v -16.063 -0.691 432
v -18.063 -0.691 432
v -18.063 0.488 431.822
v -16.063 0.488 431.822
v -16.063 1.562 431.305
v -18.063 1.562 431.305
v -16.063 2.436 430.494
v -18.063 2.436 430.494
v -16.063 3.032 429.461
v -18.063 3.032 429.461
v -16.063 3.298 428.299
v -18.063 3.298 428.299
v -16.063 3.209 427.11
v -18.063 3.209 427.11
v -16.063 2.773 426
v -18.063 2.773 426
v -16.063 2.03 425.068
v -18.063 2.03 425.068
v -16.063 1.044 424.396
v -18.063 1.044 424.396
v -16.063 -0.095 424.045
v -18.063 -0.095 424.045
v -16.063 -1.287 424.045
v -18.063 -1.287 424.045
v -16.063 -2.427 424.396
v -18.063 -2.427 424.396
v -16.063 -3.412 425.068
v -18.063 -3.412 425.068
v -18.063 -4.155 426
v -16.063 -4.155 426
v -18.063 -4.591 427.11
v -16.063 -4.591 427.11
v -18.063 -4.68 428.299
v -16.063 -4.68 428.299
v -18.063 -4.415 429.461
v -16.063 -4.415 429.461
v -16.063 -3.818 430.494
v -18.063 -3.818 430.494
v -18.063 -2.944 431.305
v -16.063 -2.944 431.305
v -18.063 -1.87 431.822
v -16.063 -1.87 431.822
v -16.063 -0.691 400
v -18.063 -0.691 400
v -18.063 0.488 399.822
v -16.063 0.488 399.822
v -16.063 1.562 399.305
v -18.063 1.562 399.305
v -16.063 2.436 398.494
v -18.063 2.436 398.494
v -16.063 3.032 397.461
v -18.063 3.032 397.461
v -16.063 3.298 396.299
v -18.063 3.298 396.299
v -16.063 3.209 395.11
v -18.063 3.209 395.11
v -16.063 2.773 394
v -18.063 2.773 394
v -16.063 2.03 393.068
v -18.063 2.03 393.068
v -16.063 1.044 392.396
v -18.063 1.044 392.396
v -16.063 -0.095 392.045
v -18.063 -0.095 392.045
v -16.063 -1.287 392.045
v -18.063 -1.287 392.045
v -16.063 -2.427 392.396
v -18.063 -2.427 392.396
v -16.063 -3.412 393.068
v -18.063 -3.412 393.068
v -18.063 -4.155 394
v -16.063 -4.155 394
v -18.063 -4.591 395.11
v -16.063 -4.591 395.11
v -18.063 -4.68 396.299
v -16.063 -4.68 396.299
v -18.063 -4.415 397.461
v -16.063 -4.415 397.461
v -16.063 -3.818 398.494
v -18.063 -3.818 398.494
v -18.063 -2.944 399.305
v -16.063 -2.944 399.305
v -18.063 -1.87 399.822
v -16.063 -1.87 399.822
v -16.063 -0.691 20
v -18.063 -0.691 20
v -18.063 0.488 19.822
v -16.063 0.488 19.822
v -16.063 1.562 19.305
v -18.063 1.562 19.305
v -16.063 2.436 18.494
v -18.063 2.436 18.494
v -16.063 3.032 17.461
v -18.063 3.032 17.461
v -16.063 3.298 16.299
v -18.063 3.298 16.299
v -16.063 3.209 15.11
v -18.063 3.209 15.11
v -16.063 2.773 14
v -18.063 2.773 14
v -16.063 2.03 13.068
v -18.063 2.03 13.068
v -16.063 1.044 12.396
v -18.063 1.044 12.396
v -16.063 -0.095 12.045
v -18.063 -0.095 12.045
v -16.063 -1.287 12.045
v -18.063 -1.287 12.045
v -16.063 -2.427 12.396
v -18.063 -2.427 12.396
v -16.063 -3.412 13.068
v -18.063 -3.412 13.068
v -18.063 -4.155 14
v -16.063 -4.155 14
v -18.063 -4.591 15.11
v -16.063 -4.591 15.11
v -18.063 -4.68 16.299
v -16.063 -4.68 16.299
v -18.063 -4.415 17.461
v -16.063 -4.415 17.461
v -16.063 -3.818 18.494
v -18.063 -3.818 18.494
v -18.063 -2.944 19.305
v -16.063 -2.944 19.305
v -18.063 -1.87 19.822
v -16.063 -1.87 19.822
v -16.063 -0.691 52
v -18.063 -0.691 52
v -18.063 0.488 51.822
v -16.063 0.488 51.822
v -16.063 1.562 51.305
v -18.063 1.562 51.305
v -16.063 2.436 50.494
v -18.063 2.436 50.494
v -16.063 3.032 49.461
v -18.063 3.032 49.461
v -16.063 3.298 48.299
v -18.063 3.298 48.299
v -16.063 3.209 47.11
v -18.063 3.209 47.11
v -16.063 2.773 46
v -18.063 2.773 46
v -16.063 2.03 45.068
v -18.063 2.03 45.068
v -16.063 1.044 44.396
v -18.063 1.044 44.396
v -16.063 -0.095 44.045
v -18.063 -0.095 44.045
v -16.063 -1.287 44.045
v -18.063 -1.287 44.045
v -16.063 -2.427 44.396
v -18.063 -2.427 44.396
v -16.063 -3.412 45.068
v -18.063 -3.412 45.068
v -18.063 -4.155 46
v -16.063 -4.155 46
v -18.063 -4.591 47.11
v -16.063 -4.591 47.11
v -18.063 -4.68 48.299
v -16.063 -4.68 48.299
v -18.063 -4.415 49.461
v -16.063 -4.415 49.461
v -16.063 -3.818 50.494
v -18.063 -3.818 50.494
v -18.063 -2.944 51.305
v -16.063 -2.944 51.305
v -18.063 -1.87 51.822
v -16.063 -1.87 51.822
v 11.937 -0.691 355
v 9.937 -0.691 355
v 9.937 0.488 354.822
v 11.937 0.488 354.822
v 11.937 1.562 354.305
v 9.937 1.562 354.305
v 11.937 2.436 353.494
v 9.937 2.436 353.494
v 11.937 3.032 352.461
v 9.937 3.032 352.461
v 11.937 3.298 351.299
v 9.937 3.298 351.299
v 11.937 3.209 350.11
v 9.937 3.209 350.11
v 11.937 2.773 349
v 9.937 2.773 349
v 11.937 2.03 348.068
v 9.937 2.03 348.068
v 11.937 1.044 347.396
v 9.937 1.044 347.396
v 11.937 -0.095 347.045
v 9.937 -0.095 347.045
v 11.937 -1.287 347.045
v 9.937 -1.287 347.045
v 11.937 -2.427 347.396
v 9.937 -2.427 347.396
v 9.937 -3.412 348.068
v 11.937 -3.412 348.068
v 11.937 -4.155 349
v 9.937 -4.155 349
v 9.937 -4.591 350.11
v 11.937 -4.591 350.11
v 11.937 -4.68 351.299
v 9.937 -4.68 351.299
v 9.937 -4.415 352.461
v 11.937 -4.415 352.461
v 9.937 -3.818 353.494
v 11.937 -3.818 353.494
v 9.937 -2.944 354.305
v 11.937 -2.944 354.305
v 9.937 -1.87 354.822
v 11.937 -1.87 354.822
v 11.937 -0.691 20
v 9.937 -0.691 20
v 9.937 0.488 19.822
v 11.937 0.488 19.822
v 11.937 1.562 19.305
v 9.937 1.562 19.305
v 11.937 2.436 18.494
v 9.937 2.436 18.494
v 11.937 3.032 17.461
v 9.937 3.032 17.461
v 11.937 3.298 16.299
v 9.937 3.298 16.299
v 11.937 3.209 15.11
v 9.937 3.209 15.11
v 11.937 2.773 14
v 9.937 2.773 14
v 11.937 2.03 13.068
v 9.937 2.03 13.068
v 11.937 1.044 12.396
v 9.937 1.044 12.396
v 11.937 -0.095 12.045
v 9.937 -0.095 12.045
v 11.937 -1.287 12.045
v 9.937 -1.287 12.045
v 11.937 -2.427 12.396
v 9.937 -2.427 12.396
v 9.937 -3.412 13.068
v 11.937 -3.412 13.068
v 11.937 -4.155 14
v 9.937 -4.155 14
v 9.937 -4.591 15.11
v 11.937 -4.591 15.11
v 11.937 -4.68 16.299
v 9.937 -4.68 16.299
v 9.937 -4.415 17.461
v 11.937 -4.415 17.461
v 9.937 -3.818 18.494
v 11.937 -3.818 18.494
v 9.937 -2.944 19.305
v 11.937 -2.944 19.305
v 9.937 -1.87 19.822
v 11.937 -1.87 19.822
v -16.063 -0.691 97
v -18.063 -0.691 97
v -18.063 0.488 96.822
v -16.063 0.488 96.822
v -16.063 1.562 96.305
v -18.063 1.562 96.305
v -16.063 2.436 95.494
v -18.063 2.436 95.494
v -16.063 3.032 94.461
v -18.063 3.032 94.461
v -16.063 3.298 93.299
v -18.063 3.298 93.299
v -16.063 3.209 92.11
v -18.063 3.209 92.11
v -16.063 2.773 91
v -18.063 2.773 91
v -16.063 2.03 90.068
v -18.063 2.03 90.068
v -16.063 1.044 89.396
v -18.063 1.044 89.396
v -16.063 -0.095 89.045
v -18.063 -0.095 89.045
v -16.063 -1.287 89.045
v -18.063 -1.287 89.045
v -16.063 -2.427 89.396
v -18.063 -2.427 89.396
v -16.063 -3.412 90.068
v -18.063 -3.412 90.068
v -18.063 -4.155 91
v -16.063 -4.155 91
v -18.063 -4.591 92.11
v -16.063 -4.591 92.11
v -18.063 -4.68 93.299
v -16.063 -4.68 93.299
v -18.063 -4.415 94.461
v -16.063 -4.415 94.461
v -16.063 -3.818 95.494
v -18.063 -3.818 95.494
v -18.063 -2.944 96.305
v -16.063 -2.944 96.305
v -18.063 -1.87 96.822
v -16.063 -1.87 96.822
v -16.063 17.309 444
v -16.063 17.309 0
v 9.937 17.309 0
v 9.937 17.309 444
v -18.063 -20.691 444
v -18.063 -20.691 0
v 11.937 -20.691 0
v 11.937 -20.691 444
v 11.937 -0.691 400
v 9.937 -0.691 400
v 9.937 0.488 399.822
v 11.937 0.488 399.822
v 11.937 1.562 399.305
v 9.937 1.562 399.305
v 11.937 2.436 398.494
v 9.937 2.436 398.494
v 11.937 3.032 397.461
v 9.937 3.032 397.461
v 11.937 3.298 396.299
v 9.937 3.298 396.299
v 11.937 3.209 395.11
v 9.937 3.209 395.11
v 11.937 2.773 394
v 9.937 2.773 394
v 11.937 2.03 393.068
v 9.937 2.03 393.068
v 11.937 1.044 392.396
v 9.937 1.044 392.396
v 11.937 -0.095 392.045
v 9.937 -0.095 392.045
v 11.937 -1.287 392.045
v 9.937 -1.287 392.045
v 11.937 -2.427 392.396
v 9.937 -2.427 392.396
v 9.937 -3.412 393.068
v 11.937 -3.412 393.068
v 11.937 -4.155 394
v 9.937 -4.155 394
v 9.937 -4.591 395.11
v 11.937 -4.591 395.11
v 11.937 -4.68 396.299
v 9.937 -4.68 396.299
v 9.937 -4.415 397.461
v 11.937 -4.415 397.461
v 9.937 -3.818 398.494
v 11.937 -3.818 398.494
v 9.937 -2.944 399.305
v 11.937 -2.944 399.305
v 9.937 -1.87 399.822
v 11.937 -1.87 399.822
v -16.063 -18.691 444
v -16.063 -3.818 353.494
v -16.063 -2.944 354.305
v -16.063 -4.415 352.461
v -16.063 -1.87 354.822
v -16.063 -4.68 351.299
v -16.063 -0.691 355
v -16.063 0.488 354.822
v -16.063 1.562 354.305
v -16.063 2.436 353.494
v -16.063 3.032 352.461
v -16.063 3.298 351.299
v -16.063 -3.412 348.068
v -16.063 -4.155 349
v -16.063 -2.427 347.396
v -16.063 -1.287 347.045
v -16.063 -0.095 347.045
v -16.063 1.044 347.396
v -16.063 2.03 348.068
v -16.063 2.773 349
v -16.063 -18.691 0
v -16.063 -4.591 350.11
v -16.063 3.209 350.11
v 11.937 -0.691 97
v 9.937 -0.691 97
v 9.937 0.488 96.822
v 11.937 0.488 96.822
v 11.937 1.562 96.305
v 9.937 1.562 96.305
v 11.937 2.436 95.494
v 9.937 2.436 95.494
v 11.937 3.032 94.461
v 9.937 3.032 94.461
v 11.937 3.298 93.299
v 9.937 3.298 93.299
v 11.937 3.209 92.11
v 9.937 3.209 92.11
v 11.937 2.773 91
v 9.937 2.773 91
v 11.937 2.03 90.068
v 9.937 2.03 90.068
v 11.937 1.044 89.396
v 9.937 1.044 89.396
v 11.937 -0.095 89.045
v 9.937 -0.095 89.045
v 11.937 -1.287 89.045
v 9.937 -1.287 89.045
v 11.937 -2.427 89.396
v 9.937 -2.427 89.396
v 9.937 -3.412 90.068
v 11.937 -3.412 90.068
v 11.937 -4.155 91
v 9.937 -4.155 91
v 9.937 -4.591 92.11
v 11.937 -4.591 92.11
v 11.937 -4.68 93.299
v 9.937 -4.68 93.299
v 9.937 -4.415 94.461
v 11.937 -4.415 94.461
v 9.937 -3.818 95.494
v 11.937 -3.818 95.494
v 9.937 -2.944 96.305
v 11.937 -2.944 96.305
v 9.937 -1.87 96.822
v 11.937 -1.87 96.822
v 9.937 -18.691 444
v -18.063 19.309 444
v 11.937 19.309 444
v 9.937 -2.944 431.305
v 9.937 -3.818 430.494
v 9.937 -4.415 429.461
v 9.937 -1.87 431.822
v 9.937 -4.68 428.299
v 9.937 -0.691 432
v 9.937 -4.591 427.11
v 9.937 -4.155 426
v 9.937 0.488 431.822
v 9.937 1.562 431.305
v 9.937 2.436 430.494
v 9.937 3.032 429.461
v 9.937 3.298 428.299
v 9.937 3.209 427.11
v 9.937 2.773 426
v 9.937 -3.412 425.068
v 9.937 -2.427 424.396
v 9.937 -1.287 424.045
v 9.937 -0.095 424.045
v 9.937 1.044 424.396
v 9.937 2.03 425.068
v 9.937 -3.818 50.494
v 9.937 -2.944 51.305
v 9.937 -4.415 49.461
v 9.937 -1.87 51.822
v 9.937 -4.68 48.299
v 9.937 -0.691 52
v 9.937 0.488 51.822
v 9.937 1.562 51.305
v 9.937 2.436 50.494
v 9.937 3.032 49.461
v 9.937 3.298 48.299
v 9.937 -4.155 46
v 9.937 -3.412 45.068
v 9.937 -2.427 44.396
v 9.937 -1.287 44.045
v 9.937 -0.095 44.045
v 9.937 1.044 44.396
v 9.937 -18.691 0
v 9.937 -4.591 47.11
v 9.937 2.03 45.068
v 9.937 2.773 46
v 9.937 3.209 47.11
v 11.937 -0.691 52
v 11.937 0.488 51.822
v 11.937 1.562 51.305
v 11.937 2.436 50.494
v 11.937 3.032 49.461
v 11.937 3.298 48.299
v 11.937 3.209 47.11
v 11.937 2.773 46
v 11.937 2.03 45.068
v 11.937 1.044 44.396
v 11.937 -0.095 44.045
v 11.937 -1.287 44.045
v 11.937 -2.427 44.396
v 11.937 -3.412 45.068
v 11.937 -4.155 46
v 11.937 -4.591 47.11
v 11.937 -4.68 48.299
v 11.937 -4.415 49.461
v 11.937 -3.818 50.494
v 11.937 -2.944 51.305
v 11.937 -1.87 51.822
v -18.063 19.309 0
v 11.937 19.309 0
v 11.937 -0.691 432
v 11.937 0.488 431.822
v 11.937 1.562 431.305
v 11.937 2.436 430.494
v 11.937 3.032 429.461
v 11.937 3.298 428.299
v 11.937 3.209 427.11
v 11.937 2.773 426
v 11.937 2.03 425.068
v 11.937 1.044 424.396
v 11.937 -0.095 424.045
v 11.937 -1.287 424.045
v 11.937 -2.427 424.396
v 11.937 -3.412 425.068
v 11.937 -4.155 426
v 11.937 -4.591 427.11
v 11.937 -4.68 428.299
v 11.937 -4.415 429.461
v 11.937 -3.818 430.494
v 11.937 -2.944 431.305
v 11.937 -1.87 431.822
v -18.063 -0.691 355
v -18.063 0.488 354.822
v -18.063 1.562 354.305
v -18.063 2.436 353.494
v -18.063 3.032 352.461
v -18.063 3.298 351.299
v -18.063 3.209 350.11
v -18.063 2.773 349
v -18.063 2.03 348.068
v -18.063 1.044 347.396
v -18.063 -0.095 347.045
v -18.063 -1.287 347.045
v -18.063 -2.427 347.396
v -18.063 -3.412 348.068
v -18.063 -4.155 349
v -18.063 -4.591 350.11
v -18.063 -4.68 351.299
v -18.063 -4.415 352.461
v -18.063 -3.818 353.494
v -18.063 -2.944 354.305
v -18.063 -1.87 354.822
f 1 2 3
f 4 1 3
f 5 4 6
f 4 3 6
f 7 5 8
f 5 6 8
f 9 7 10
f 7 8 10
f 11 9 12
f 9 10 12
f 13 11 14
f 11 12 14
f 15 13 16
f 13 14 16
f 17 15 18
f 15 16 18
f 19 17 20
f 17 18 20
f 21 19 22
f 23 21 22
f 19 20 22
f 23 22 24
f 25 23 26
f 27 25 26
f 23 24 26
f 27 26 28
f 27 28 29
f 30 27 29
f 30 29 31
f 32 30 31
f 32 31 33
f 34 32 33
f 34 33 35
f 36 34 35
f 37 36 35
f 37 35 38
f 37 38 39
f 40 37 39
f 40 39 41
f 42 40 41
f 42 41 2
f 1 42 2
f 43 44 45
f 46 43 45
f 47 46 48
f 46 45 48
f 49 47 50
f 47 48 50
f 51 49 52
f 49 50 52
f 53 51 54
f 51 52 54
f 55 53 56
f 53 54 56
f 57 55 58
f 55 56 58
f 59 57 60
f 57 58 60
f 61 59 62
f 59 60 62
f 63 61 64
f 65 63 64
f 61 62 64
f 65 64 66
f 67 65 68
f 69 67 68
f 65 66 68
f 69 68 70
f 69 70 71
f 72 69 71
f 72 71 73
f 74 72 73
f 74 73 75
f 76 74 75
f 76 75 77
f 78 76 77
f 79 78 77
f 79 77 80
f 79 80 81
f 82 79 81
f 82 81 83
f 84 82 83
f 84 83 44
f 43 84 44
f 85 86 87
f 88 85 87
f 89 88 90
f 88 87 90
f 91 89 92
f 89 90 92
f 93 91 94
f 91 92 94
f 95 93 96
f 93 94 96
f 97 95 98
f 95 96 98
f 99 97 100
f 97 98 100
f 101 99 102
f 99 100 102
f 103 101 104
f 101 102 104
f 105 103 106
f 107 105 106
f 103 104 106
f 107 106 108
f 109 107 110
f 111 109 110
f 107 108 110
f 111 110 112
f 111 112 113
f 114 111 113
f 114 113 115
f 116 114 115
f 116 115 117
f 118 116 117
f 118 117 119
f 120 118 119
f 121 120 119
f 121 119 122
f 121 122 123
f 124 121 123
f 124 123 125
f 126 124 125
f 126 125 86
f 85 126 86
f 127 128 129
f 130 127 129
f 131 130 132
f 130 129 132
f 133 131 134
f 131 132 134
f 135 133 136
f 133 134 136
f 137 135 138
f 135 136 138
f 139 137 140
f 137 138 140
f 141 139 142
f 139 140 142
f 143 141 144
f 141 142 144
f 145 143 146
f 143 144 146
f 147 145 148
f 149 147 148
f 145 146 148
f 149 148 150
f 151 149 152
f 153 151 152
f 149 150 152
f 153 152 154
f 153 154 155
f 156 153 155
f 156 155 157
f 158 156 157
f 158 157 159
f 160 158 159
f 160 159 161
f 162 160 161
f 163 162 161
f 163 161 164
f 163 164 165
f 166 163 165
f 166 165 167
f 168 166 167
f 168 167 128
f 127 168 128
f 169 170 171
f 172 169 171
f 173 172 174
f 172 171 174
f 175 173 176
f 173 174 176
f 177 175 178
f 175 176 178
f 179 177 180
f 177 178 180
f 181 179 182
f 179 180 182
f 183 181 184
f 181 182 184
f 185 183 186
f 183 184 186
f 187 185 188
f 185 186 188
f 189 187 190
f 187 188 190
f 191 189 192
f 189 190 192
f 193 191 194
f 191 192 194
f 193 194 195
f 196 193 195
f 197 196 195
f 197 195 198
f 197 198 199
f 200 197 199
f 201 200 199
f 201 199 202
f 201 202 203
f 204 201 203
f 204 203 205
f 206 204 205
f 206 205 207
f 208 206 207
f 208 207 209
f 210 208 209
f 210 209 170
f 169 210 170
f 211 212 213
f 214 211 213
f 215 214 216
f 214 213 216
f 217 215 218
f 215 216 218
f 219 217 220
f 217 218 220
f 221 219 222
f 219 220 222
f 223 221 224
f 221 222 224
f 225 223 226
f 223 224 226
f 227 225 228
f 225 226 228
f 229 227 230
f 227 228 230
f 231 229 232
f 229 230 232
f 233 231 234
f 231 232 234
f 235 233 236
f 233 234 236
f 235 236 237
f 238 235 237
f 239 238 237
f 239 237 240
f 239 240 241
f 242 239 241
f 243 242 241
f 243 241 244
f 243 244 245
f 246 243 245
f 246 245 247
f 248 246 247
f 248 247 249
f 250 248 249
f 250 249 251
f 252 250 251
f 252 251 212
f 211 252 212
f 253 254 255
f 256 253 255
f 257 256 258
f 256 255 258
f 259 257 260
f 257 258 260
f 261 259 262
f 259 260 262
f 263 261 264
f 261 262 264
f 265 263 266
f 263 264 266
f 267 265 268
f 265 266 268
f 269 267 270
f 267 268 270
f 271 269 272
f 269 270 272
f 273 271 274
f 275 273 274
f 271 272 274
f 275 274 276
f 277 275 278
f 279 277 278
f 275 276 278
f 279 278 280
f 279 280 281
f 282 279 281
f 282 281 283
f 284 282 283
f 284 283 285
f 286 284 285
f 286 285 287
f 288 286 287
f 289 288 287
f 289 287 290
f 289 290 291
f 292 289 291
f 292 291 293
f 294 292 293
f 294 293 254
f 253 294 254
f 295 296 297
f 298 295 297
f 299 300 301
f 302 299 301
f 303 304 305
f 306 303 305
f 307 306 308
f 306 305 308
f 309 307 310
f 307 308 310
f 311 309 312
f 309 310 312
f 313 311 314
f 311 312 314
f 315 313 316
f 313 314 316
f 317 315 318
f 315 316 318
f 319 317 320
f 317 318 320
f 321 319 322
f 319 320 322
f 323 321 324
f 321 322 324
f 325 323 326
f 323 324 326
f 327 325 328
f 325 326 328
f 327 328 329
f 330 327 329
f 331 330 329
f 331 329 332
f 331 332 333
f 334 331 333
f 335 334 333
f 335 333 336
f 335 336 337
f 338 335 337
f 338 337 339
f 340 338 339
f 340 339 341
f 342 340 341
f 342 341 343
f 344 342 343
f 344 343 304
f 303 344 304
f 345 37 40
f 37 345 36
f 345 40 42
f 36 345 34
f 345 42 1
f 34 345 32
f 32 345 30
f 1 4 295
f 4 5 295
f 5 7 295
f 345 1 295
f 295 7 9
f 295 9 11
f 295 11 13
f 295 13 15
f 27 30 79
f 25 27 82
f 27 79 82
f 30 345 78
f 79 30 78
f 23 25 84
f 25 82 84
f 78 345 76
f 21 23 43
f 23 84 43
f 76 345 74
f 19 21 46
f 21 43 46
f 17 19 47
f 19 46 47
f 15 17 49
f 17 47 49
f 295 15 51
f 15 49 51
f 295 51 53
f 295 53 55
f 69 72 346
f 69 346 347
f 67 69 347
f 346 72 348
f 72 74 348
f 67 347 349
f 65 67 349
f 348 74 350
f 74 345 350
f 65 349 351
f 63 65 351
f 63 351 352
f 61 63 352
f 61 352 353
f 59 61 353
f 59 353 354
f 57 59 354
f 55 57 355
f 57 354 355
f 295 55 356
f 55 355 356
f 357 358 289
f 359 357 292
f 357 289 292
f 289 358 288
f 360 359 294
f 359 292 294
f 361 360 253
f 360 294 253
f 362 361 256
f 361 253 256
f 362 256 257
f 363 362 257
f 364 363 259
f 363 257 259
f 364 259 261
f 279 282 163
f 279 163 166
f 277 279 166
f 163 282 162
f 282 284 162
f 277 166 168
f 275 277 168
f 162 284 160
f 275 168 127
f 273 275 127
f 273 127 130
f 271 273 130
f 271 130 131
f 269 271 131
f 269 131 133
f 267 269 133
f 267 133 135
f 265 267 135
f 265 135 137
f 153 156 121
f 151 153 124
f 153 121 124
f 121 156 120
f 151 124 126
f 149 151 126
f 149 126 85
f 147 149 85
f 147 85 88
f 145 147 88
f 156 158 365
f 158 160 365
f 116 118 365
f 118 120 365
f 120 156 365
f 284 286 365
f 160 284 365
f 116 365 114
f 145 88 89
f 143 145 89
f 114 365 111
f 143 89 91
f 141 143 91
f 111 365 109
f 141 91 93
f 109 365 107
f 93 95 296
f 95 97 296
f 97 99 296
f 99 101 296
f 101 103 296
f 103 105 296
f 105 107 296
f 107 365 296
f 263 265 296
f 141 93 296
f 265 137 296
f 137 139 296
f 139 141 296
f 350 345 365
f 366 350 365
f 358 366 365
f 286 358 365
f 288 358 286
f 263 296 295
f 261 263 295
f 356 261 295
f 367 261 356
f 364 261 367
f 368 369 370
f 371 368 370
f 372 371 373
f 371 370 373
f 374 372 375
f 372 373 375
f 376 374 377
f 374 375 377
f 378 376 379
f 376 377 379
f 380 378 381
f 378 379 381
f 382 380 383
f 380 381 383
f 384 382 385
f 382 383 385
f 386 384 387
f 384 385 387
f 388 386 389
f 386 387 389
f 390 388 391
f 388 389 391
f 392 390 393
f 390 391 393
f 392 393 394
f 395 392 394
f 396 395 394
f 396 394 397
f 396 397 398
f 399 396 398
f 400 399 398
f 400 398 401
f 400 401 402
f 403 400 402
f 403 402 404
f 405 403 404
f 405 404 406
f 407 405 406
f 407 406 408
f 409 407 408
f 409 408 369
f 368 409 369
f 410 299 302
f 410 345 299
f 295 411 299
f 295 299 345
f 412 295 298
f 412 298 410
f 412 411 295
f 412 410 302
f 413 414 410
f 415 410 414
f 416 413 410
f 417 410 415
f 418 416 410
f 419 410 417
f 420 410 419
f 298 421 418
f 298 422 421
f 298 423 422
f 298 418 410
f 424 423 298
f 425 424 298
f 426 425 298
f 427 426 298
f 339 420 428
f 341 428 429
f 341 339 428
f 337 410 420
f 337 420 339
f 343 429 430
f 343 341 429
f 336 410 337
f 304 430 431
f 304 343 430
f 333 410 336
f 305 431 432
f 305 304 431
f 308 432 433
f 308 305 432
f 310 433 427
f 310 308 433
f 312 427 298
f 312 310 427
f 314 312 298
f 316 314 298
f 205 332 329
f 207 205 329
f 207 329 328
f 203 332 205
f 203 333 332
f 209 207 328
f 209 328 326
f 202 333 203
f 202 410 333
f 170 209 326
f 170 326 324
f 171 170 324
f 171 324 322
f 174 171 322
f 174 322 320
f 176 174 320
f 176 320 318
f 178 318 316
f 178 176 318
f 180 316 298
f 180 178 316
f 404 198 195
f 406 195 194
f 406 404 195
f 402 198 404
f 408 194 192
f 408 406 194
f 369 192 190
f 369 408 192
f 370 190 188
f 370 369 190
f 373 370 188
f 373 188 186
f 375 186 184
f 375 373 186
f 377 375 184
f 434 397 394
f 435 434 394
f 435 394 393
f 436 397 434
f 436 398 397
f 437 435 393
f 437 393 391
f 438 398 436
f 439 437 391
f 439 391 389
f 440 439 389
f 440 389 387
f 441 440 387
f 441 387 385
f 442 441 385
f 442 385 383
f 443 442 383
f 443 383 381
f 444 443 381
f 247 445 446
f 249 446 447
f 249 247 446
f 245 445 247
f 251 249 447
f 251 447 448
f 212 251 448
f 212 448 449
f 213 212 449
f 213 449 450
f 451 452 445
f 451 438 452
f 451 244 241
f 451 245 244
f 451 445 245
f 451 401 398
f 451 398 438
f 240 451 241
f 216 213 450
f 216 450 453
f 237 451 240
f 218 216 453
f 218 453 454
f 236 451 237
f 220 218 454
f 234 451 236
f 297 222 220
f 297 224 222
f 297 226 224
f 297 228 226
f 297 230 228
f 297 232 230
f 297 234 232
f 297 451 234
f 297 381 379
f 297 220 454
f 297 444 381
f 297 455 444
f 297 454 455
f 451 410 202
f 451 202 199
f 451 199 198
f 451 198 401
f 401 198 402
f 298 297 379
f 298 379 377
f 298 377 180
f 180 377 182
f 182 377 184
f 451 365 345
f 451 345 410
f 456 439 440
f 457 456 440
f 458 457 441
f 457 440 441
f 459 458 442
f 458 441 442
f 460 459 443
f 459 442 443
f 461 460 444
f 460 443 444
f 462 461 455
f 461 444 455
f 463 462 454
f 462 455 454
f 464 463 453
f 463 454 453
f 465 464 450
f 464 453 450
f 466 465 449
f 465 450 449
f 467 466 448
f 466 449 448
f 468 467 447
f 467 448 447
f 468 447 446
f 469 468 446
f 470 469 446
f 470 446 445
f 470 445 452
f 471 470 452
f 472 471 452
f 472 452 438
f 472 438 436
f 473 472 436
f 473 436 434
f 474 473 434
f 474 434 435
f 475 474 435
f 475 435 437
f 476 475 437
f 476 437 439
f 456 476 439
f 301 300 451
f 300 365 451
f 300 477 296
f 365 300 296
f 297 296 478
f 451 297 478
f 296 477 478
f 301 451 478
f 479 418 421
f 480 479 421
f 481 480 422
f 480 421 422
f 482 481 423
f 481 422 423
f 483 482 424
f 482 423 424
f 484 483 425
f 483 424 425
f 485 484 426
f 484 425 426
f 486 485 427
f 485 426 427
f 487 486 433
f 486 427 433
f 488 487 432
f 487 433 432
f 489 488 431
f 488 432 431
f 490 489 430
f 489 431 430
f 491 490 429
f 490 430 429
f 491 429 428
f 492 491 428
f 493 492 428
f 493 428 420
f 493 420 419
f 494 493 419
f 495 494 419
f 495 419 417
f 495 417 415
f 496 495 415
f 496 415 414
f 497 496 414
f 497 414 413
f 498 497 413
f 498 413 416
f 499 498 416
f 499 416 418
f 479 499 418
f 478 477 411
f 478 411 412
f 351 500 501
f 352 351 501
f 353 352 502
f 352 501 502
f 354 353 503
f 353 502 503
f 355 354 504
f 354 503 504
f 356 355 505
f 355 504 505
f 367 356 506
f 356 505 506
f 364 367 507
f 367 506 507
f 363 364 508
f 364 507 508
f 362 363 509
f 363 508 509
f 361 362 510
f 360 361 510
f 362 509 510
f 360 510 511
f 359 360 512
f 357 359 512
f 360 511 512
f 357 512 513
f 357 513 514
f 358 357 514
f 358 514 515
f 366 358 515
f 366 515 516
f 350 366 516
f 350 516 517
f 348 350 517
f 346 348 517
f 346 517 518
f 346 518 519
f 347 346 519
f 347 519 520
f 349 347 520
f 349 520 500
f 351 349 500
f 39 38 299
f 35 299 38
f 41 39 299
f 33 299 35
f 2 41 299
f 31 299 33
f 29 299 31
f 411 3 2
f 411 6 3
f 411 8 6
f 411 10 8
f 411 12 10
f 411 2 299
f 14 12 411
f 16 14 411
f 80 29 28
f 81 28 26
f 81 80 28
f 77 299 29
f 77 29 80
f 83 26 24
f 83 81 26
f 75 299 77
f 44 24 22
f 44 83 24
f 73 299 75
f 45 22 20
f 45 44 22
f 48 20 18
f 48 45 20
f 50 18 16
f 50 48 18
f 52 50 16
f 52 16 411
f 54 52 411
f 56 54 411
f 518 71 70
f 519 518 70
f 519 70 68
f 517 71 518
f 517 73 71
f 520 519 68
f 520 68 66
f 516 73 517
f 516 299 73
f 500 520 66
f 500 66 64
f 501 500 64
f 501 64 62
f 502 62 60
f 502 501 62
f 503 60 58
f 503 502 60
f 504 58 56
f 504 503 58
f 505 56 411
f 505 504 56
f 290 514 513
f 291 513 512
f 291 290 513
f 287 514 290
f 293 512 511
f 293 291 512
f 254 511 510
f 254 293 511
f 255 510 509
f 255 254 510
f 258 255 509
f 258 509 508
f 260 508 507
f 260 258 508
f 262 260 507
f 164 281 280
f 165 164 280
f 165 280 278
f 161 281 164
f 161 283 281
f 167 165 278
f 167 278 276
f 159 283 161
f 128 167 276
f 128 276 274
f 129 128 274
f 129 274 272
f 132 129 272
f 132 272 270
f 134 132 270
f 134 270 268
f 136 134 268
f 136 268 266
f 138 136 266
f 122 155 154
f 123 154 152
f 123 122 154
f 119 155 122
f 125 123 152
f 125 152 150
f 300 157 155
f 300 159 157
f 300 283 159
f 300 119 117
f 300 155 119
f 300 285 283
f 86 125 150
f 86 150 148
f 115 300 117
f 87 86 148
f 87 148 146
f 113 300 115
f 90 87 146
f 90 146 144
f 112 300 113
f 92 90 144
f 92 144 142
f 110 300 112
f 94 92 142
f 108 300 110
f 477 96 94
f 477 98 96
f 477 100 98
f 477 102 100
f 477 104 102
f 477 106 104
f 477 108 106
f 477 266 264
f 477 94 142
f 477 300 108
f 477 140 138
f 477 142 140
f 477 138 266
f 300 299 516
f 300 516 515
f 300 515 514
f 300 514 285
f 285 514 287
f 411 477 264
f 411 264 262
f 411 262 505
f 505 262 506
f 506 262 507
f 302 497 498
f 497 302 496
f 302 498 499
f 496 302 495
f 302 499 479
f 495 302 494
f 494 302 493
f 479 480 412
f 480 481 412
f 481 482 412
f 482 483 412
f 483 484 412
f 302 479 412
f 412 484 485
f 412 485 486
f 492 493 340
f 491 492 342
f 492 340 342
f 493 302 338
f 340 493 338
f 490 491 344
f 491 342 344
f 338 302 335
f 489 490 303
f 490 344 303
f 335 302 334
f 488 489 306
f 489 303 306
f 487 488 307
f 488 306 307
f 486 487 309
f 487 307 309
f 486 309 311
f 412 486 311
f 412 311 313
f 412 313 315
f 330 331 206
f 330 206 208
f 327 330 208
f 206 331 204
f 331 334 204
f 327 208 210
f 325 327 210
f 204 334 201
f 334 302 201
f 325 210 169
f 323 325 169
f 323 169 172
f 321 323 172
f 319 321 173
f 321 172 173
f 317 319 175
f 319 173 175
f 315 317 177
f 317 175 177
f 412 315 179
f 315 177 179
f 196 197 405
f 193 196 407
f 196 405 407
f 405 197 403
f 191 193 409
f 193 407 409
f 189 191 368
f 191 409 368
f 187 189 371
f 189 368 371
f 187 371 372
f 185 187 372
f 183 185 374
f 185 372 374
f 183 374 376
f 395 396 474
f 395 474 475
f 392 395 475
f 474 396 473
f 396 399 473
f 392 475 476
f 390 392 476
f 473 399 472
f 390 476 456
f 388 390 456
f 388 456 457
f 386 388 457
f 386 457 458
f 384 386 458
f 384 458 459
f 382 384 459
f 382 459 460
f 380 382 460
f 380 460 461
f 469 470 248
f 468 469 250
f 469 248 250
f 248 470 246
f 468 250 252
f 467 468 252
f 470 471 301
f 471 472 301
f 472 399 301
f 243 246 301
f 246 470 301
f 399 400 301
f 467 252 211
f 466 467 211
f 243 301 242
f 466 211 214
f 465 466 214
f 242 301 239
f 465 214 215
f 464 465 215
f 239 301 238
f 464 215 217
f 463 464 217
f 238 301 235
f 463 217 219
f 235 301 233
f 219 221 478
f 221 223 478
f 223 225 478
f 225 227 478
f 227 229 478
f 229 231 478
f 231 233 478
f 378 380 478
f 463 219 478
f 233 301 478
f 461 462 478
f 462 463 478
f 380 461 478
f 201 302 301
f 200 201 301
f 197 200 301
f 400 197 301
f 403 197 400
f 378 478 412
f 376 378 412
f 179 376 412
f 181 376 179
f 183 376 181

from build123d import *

# Parameters (mm, degrees)
SKETCH_1_W          = 30
SKETCH_1_H          = 40
SKETCH_1_W_2        = 26
SKETCH_1_H_2        = 36
EXTRUDE_1_DEPTH     = 444
SKETCH_2_R          = 4
CUT_EXTRUDE_1_DEPTH = 96


with BuildPart() as part:
    # 草图1 → 凸台-拉伸1 (new body)
    with BuildSketch(Plane.XY):
        with Locations((-3.063208411, -0.691053078)):
            Rectangle(SKETCH_1_W, SKETCH_1_H)
        with Locations((-3.063208411, -0.691053078)):
            Rectangle(SKETCH_1_W_2, SKETCH_1_H_2, mode=Mode.SUBTRACT)
    extrude(amount=EXTRUDE_1_DEPTH)

    # 草图2 → 切除-拉伸1 (cut)
    with BuildSketch(Plane.ZY.offset(18.063208411)):
        with Locations((396, -0.691053078)):
            Circle(SKETCH_2_R)
        with Locations((428, -0.691053078)):
            Circle(SKETCH_2_R)
        with Locations((16, -0.691053078)):
            Circle(SKETCH_2_R)
        with Locations((48, -0.691053078)):
            Circle(SKETCH_2_R)
        with Locations((93, -0.691053078)):
            Circle(SKETCH_2_R)
        with Locations((351, -0.691053078)):
            Circle(SKETCH_2_R)
    extrude(amount=-CUT_EXTRUDE_1_DEPTH, mode=Mode.SUBTRACT)


solid = part.part
